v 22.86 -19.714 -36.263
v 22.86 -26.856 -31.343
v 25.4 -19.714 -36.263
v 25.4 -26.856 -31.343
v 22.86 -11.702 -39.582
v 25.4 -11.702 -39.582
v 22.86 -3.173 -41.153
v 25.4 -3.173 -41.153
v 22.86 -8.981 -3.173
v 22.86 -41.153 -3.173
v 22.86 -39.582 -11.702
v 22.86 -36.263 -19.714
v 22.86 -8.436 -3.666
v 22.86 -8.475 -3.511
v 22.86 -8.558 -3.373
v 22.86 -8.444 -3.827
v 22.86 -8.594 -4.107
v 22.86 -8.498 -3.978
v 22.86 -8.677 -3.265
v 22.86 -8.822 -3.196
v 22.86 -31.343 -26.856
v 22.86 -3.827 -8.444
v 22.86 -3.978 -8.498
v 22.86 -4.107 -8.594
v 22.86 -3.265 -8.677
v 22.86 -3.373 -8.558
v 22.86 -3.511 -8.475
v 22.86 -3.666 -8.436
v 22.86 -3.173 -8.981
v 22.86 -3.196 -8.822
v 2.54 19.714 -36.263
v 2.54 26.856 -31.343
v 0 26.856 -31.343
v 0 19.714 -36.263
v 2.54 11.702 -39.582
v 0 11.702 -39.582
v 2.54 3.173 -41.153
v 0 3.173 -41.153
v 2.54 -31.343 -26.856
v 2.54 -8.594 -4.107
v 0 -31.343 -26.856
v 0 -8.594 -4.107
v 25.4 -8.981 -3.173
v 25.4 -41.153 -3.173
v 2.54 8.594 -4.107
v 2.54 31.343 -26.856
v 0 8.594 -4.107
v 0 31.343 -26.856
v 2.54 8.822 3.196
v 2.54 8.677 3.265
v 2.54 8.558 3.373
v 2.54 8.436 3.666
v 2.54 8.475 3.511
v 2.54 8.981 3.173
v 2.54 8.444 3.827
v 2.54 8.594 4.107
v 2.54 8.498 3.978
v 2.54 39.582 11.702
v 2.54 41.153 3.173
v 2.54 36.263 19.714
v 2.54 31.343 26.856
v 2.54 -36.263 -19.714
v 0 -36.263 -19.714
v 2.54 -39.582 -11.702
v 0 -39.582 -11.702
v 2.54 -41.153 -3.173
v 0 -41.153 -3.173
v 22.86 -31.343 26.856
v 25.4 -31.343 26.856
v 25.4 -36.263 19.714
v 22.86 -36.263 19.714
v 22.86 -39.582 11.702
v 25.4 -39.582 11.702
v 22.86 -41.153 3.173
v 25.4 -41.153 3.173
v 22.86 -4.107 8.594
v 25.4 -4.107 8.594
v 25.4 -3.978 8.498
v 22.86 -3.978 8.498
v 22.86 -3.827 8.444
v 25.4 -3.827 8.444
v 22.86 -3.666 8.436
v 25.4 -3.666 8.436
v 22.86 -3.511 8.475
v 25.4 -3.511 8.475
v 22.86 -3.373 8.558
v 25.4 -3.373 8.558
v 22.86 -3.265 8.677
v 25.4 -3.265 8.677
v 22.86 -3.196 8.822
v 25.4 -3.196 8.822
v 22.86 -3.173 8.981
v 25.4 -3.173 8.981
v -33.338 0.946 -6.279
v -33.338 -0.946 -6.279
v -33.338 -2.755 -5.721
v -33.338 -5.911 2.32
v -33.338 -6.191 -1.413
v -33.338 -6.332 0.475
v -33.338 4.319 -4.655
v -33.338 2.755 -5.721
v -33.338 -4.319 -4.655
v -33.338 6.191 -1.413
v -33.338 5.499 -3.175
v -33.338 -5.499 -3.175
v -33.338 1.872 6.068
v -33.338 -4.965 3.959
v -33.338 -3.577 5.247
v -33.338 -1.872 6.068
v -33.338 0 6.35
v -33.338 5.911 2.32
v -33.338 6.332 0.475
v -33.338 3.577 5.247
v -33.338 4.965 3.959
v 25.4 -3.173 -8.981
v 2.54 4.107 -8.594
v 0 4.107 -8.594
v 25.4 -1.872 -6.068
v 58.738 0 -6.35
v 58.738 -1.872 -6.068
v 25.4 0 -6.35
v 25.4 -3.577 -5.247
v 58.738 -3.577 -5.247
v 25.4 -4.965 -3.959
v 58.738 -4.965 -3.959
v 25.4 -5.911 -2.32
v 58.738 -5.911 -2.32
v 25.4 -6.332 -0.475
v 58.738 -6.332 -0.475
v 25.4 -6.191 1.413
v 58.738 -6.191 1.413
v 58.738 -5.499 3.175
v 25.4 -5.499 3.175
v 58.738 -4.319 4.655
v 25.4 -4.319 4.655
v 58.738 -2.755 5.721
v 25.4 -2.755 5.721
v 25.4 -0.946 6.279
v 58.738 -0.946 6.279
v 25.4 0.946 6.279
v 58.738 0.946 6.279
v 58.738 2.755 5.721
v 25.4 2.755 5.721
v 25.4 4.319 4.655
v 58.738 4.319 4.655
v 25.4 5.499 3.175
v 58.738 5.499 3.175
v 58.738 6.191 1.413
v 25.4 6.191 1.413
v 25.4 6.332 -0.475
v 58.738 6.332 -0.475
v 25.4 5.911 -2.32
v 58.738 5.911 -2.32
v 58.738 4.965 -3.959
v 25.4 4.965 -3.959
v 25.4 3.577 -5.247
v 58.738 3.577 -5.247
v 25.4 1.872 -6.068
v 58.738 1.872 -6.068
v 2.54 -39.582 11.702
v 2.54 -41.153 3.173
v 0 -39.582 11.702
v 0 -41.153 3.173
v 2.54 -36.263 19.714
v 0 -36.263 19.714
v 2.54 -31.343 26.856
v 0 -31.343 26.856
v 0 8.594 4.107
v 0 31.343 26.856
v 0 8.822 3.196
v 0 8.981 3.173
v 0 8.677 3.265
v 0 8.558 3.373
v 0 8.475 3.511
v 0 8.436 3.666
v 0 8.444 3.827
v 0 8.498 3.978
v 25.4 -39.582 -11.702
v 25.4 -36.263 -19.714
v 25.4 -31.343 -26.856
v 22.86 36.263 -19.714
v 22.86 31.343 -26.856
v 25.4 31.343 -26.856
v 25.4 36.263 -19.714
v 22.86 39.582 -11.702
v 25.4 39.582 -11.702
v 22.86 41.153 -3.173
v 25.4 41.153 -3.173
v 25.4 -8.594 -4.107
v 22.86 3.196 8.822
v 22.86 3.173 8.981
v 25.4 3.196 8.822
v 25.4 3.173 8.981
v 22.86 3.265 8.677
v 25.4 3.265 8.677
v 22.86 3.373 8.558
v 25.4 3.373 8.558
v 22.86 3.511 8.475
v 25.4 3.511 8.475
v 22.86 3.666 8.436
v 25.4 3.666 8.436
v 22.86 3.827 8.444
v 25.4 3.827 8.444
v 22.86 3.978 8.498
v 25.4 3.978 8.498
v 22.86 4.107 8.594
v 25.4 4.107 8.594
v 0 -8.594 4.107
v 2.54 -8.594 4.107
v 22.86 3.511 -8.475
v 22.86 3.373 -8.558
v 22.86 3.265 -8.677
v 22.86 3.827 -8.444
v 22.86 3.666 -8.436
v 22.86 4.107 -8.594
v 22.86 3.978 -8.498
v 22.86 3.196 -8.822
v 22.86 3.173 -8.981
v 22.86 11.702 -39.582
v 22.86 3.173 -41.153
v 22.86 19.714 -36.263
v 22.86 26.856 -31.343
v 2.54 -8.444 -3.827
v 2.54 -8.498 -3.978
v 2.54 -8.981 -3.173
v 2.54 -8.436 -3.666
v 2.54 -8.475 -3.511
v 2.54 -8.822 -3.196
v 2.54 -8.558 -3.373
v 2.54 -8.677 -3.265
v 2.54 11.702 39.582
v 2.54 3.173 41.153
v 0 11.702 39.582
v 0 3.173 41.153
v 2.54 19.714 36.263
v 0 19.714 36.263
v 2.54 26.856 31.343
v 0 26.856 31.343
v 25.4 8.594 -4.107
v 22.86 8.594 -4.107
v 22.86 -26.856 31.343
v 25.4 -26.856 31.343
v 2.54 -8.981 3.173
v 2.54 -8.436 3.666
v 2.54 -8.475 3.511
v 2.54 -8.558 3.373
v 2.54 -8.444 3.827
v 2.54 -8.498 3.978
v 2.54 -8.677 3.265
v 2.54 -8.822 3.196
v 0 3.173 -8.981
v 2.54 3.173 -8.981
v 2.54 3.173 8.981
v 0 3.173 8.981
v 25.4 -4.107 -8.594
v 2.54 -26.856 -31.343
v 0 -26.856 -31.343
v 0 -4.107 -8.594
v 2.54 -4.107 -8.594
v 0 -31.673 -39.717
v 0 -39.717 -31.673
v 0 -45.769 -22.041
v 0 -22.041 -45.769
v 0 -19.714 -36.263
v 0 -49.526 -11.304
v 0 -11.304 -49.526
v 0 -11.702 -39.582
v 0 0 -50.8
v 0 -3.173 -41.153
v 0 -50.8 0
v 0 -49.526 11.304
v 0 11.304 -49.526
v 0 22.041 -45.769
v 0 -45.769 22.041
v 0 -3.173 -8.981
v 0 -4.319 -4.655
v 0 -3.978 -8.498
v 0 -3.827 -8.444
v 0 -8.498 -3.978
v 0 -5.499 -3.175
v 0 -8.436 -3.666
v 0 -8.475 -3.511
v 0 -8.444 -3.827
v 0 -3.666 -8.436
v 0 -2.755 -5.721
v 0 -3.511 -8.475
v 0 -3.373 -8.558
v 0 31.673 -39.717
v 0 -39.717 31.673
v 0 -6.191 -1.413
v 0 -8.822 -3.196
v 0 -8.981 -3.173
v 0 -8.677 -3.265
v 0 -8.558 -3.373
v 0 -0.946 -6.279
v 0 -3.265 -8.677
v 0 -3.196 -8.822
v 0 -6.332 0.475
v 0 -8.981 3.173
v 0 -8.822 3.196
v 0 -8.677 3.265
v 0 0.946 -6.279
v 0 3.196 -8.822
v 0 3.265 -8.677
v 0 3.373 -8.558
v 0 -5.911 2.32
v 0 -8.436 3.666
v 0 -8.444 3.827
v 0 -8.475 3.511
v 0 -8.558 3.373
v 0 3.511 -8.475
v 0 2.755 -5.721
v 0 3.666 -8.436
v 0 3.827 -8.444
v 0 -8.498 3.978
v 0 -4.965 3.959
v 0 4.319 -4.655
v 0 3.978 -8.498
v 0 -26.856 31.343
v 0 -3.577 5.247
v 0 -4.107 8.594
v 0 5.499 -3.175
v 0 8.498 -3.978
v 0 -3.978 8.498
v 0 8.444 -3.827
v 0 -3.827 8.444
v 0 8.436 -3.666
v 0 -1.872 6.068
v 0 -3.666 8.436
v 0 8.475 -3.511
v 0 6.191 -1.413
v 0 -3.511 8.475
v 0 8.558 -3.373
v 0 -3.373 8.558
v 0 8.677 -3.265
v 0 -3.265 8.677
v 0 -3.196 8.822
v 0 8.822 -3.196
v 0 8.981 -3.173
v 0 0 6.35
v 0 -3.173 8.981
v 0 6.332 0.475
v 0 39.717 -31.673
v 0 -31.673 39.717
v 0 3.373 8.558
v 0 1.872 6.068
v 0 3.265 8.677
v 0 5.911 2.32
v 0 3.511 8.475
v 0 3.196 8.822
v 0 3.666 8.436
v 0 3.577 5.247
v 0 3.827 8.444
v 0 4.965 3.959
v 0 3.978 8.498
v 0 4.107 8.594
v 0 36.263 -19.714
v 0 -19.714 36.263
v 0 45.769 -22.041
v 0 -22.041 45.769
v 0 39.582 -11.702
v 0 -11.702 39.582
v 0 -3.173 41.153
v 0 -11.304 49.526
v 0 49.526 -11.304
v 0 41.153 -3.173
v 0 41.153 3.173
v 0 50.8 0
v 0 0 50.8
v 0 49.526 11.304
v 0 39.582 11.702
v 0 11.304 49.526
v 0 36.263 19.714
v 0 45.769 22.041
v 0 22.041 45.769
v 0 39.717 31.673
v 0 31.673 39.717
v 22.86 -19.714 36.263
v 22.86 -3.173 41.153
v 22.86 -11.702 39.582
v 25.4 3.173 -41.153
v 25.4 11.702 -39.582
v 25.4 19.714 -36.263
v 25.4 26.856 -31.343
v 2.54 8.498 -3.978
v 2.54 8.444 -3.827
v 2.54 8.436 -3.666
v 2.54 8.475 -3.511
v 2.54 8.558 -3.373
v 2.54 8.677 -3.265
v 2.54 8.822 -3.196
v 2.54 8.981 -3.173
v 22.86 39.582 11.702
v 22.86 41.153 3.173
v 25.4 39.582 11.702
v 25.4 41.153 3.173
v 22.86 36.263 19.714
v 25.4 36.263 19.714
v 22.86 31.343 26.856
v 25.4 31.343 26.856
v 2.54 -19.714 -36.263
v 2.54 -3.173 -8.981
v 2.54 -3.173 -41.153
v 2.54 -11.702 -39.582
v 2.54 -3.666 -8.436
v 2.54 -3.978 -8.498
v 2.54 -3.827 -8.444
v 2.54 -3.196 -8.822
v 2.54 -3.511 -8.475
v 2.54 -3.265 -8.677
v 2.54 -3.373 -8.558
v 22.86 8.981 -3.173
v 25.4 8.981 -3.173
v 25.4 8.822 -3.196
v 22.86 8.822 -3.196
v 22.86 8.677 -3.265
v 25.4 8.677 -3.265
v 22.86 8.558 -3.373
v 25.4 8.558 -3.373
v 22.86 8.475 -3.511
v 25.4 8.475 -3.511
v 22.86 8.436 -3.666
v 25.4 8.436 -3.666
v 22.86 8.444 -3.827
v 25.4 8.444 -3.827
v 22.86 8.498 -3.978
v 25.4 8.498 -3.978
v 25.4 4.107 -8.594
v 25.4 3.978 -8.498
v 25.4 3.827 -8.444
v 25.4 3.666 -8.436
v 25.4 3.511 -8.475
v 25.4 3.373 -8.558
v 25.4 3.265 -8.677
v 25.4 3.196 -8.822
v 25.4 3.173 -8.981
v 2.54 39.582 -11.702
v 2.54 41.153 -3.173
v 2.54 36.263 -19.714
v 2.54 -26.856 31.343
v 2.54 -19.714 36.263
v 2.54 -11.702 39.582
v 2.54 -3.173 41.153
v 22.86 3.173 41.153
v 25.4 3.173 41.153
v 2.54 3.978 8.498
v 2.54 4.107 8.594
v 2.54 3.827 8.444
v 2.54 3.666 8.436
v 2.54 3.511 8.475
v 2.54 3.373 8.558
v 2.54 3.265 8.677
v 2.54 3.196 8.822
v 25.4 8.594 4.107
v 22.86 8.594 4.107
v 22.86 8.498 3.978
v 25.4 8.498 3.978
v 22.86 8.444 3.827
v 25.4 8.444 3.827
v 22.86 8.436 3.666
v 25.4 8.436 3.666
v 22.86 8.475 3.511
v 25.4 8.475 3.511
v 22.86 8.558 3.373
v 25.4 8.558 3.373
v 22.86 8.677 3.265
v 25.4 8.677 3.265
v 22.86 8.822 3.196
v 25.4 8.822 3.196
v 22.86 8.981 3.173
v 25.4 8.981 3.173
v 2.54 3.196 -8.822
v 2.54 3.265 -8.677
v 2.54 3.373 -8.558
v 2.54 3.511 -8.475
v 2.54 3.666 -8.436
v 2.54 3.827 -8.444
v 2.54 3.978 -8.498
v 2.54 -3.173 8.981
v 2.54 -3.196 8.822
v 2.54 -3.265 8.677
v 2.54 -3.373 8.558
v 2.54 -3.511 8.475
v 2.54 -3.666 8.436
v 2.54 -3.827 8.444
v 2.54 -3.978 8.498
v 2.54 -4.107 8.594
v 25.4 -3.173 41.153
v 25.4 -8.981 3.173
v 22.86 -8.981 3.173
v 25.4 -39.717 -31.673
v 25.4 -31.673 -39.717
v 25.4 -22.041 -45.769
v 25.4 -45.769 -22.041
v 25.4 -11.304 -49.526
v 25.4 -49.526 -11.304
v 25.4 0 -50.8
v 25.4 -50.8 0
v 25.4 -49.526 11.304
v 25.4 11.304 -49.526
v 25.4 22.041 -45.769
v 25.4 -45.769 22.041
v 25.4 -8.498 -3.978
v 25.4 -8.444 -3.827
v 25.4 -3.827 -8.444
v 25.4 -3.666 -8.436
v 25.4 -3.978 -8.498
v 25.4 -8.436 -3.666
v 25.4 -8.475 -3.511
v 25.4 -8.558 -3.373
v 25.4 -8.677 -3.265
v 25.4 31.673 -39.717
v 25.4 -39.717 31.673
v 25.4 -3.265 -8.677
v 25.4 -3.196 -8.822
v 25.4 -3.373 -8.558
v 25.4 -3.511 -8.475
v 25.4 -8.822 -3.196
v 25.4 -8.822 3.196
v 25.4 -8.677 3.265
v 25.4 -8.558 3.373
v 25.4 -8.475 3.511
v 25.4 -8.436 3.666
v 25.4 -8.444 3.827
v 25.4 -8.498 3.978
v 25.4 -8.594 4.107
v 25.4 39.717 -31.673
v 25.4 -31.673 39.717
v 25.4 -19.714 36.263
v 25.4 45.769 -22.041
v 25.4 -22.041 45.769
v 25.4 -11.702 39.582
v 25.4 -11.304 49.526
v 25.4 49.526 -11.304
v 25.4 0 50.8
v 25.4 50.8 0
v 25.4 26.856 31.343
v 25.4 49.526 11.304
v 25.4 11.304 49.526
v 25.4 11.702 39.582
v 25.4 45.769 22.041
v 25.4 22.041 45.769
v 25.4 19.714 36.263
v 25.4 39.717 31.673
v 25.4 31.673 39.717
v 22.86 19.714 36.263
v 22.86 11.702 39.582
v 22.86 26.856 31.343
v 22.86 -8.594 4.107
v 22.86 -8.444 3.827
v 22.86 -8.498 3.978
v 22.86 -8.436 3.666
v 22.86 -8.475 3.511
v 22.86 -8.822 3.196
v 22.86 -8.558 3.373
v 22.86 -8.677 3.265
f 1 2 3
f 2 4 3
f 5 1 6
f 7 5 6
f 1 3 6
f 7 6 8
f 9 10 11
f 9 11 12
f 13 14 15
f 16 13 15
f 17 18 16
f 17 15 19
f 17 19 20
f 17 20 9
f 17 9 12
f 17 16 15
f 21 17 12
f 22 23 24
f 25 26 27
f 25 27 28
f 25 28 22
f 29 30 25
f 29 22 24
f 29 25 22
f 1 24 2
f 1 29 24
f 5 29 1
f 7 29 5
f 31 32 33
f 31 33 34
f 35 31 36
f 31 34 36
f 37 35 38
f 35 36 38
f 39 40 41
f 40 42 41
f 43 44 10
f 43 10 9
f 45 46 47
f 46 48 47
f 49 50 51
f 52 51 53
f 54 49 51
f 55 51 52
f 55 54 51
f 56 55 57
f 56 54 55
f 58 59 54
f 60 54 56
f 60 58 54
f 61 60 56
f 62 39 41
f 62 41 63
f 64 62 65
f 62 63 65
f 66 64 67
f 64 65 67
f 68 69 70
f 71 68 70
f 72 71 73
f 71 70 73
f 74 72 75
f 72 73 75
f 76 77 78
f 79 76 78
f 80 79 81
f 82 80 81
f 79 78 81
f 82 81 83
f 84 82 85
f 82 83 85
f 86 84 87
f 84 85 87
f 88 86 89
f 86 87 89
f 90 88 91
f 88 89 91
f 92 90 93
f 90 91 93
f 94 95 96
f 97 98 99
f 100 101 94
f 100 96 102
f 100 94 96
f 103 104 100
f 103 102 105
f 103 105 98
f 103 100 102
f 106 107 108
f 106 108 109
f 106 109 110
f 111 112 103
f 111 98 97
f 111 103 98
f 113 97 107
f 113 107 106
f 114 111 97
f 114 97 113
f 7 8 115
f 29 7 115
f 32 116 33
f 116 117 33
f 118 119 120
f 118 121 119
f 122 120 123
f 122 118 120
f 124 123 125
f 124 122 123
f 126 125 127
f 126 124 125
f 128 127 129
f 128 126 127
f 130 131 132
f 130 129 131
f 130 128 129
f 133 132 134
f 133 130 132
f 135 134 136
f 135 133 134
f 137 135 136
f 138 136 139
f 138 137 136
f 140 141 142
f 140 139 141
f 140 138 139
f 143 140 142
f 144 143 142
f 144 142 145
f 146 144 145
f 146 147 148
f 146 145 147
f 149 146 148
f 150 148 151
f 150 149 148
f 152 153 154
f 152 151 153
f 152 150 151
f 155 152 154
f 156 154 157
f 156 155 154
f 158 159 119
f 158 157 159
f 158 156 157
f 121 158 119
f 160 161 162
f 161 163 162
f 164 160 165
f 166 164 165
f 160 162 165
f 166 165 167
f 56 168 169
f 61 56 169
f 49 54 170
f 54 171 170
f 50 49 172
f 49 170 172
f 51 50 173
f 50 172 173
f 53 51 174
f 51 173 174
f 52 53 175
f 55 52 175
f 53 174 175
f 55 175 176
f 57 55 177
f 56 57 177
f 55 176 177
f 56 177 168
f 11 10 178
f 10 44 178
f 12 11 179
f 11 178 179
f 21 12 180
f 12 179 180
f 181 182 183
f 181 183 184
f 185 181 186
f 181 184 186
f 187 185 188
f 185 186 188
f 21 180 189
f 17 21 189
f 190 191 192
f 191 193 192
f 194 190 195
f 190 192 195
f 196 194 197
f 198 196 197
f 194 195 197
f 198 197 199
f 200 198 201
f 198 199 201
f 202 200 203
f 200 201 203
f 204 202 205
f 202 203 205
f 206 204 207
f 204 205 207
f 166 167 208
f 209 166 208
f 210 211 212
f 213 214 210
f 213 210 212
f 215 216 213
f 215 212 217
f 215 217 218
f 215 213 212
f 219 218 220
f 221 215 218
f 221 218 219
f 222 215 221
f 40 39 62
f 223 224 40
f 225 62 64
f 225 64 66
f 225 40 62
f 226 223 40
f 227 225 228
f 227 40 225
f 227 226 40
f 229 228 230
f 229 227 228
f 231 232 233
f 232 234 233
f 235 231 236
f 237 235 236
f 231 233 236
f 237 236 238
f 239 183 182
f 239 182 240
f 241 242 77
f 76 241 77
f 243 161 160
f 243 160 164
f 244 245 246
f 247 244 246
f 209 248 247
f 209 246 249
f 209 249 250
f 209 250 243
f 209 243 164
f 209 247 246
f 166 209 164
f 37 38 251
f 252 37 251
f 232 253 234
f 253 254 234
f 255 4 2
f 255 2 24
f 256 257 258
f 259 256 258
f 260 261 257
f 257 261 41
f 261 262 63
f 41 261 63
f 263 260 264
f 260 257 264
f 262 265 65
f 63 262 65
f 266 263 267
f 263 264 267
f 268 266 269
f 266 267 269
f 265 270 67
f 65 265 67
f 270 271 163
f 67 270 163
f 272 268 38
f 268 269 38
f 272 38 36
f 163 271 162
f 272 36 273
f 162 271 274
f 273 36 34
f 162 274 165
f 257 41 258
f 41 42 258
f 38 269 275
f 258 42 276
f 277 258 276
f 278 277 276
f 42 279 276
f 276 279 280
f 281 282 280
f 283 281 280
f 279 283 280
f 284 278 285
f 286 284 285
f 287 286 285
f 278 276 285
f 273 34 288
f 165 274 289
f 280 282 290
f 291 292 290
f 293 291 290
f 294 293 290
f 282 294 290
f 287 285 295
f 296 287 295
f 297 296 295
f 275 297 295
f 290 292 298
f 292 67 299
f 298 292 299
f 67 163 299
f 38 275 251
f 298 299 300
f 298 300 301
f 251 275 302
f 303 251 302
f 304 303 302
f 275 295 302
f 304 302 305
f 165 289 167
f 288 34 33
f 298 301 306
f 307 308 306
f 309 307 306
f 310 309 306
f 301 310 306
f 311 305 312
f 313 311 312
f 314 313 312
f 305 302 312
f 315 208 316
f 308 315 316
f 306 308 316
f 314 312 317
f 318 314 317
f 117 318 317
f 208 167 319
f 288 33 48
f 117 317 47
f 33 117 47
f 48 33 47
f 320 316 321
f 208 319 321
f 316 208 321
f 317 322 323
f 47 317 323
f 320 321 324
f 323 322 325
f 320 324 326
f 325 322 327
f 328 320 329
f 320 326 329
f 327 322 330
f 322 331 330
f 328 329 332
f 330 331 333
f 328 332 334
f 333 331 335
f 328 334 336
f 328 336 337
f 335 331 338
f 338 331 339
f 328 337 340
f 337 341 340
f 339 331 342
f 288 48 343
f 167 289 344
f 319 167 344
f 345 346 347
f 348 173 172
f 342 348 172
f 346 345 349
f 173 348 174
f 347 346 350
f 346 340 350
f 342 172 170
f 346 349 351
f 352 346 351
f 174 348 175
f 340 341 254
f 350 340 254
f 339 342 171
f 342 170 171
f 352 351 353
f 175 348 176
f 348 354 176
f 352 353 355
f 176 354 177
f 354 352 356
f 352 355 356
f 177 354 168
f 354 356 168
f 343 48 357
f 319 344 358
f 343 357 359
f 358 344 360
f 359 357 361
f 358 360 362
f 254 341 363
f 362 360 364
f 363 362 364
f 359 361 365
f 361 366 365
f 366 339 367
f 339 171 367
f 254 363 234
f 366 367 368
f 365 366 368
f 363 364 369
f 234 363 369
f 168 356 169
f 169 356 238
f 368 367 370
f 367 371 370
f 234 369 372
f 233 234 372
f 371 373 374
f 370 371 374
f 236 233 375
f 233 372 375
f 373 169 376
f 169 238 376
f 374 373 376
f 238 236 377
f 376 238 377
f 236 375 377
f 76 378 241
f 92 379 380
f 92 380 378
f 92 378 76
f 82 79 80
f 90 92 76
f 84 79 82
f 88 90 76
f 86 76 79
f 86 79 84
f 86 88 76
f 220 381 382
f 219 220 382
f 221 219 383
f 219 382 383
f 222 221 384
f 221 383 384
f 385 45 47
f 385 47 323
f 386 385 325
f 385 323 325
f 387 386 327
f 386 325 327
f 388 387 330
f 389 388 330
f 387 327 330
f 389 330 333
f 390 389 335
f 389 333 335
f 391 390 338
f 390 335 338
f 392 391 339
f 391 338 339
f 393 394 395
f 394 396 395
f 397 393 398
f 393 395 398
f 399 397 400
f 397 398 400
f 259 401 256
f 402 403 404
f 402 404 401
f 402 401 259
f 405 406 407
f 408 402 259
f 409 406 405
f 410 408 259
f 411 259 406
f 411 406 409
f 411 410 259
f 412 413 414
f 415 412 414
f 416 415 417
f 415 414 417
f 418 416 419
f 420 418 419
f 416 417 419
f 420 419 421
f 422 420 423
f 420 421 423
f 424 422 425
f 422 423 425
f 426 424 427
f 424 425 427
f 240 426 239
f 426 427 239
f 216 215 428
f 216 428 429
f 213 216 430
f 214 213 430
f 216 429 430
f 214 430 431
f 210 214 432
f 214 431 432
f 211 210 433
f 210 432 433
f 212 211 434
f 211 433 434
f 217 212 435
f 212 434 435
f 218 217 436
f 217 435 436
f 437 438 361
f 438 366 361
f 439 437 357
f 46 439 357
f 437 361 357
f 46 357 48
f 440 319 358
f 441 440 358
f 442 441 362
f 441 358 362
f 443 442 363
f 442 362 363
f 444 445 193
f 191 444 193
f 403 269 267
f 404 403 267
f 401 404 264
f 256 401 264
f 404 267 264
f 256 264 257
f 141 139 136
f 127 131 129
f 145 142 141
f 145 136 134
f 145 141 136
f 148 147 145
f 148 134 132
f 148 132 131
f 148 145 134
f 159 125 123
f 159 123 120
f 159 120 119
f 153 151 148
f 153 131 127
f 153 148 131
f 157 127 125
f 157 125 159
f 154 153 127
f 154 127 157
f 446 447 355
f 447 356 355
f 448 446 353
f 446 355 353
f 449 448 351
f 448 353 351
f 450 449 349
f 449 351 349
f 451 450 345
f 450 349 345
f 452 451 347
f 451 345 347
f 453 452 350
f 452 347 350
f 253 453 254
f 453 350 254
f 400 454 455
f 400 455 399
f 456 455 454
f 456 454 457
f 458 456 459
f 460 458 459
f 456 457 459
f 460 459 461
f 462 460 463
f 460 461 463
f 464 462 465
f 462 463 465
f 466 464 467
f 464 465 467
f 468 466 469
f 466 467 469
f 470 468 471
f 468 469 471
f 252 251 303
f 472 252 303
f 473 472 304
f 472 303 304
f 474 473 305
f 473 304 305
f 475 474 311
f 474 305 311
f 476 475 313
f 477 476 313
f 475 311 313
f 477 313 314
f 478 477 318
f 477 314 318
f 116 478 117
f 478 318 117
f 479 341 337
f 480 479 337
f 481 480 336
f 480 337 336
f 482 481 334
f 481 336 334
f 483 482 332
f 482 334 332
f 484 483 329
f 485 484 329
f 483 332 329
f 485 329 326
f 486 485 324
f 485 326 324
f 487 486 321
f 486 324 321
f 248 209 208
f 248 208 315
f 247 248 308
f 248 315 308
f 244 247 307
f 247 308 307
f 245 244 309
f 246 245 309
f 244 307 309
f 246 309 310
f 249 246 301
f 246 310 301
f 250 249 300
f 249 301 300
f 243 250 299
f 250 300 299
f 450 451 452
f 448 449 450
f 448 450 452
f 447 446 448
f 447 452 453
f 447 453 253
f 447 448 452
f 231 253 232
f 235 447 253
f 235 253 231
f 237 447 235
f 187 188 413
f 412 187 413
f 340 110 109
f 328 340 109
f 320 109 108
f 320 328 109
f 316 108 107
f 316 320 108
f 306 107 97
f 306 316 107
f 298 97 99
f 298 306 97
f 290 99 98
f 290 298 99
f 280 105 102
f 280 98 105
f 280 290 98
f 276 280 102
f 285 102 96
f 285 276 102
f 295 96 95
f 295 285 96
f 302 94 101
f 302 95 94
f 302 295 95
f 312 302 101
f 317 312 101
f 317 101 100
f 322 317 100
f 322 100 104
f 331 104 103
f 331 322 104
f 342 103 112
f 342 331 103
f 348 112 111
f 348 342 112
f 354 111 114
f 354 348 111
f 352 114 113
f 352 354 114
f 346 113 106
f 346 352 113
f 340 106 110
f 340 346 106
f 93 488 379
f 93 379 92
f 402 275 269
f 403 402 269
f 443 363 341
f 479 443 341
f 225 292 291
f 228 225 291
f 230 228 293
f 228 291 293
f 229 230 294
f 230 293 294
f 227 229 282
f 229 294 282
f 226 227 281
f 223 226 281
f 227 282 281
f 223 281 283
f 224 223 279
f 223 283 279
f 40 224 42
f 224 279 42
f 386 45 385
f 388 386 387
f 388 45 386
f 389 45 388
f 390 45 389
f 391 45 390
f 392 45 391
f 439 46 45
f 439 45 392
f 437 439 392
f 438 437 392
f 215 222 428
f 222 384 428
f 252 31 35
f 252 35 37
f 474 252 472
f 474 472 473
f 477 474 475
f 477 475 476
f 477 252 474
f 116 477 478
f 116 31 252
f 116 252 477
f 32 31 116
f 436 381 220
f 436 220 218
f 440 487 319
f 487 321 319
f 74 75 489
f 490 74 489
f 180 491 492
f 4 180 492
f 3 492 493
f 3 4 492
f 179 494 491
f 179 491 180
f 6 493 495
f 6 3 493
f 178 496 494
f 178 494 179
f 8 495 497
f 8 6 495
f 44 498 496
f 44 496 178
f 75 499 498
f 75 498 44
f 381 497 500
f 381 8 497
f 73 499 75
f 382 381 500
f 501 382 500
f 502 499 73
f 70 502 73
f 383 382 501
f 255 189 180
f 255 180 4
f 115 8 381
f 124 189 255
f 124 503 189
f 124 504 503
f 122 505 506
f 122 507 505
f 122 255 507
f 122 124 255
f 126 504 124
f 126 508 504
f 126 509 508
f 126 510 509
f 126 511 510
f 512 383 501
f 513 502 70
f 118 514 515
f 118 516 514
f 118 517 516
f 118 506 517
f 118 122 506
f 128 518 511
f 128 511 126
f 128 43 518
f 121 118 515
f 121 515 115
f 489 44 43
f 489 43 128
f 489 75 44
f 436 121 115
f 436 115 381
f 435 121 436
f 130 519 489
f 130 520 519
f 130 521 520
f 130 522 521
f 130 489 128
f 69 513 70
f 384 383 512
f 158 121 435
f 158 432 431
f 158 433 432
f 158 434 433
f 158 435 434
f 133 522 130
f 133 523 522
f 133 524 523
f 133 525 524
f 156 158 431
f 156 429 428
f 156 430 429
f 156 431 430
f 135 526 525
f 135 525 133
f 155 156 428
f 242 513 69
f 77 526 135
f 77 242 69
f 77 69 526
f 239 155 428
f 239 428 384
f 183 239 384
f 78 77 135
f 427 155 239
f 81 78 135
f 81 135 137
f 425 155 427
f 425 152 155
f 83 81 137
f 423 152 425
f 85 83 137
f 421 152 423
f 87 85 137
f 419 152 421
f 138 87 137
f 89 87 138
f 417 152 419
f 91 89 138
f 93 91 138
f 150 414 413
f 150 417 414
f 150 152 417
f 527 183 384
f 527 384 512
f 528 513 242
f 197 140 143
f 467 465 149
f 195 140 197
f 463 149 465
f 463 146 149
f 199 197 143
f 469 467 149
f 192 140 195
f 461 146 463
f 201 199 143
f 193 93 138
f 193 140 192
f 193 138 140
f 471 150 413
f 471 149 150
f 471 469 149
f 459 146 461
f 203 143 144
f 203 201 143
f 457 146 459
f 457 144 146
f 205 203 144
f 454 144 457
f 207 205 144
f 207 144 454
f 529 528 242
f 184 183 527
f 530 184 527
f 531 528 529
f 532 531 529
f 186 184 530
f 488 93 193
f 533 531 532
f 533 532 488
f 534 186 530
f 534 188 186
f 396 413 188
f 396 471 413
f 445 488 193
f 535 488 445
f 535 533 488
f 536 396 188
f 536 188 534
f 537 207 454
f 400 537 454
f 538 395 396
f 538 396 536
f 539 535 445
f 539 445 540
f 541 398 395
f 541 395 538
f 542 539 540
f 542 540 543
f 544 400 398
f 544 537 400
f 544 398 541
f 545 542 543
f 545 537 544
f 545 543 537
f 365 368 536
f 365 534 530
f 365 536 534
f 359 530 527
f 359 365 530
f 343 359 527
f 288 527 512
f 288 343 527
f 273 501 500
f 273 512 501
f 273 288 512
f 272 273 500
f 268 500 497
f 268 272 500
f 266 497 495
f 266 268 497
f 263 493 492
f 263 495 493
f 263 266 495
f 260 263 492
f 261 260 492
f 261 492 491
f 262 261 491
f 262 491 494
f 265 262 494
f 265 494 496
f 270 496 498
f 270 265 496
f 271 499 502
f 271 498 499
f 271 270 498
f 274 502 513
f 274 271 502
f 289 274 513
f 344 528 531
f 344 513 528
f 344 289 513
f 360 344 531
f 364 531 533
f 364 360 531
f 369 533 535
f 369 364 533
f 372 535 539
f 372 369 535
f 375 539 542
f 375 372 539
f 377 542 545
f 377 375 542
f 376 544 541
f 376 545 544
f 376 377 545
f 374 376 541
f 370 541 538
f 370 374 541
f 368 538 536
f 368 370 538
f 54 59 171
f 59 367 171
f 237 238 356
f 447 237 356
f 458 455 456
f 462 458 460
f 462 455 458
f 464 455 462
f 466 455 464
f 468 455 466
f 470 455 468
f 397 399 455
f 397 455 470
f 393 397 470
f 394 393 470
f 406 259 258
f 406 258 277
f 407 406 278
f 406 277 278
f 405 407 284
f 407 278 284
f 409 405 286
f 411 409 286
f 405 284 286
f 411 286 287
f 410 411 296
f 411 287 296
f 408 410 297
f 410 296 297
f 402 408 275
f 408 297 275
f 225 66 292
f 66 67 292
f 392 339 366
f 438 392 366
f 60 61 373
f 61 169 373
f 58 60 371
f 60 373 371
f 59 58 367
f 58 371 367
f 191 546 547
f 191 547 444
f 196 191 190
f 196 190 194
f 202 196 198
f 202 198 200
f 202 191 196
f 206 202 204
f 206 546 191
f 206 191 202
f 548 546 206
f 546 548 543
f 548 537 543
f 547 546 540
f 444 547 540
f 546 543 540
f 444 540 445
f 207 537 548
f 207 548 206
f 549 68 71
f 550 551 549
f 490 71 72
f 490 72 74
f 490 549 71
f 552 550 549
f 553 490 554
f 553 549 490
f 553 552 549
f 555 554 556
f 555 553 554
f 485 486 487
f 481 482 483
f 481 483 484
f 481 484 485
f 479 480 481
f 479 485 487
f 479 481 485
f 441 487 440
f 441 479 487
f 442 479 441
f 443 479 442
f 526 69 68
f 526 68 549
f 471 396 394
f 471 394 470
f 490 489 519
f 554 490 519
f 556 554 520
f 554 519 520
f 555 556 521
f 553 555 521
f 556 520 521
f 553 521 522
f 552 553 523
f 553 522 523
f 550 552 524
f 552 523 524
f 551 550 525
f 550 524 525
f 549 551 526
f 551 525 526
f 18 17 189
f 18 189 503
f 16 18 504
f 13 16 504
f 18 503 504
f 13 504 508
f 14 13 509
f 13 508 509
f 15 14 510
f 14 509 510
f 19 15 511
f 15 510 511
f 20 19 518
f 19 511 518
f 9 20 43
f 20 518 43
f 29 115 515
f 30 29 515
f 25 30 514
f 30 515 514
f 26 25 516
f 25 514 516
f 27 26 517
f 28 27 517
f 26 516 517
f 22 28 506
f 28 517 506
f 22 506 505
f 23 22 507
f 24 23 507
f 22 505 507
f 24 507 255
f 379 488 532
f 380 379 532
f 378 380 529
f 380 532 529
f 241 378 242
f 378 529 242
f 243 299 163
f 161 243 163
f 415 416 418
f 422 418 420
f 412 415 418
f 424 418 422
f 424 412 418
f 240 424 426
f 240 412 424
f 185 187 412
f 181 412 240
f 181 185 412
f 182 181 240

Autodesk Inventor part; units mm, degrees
ref_plane "YZ Plane" through (0, 0, 0) normal (1, 0, 0) x (0, 1, 0)
ref_plane "XZ Plane" through (0, 0, 0) normal (0, 1, 0) x (-1, 0, 0)
ref_plane "XY Plane" through (0, 0, 0) normal (0, 0, 1) x (1, 0, 0)
sketch "Sketch1" plane through (0, 0, 0) normal (1, 0, 0) x (0, 1, 0)
  circle A0 centre (0, 0) radius 50.8
  dimension "d0" = 101.6
extrude "Extrusion1" add sketch "Sketch1" along normal blind 25.4
sketch "Sketch2" plane through (25.4, 0, 0) normal (1, 0, 0) x (0, 0, -1)
  circle A0 centre (0, 0) radius 6.35
  dimension "d4" = 12.7
extrude "Extrusion2" add sketch "Sketch2" along normal blind 33.3375
sketch "Sketch3" plane through (0, 0, 0) normal (-1, 0, 0) x (0, 0, 1)
  circle A0 centre (0, 0) radius 6.35
extrude "Extrusion3" add sketch "Sketch3" along normal blind 33.3375
sketch "Sketch5" plane through (25.4, 0, 0) normal (1, 0, 0) x (0, 0, -1)
  circle A0 centre (0, 0) radius 44.45
  arc A1 (31.3429, -26.8561) -> (41.1529, -3.1727) centre (0, 0) ccw
  line L0 (0, 0) -> (82.55, 0) construction
  line L1 (41.1529, -3.1727) -> (8.9811, -3.1727)
  line L2 (31.3429, -26.8561) -> (82.1429, -26.8561) construction
  line L3 (31.3429, -26.8561) -> (8.594, -4.1072)
  line L4 (-4.1072, 8.594) -> (-4.5781, 9.0649)
  arc A2 (8.9811, -3.1727) -> (8.594, -4.1072) centre (8.9811, -3.7201) ccw
  arc A3 (41.1529, 3.1727) -> (31.3429, 26.8561) centre (0, 0) ccw
  line L5 (31.3429, 26.8561) -> (8.594, 4.1072)
  line L6 (41.1529, 3.1727) -> (8.9811, 3.1727)
  arc A4 (8.594, 4.1072) -> (8.9811, 3.1727) centre (8.9811, 3.7201) ccw
  arc A5 (26.8561, 31.3429) -> (3.1727, 41.1529) centre (0, 0) ccw
  line L7 (3.1727, 41.1529) -> (3.1727, 8.9811)
  line L8 (26.8561, 31.3429) -> (4.1072, 8.594)
  arc A6 (3.1727, 8.9811) -> (4.1072, 8.594) centre (3.7201, 8.9811) ccw
  arc A7 (-3.1727, 41.1529) -> (-26.8561, 31.3429) centre (0, 0) ccw
  line L9 (-26.8561, 31.3429) -> (-4.1072, 8.594)
  line L10 (-3.1727, 41.1529) -> (-3.1727, 8.9811)
  arc A8 (-4.1072, 8.594) -> (-3.1727, 8.9811) centre (-3.7201, 8.9811) ccw
  arc A9 (-31.3429, 26.8561) -> (-41.1529, 3.1727) centre (0, 0) ccw
  line L11 (-41.1529, 3.1727) -> (-8.9811, 3.1727)
  line L12 (-31.3429, 26.8561) -> (-8.594, 4.1072)
  arc A10 (-8.9811, 3.1727) -> (-8.594, 4.1072) centre (-8.9811, 3.7201) ccw
  arc A11 (-41.1529, -3.1727) -> (-31.3429, -26.8561) centre (0, 0) ccw
  line L13 (-31.3429, -26.8561) -> (-8.594, -4.1072)
  line L14 (-41.1529, -3.1727) -> (-8.9811, -3.1727)
  arc A12 (-8.594, -4.1072) -> (-8.9811, -3.1727) centre (-8.9811, -3.7201) ccw
  arc A13 (-26.8561, -31.3429) -> (-3.1727, -41.1529) centre (0, 0) ccw
  line L15 (-3.1727, -41.1529) -> (-3.1727, -8.9811)
  line L16 (-26.8561, -31.3429) -> (-4.1072, -8.594)
  arc A14 (-3.1727, -8.9811) -> (-4.1072, -8.594) centre (-3.7201, -8.9811) ccw
  arc A15 (3.1727, -41.1529) -> (26.8561, -31.3429) centre (0, 0) ccw
  line L17 (26.8561, -31.3429) -> (4.1072, -8.594)
  line L18 (3.1727, -41.1529) -> (3.1727, -8.9811)
  arc A16 (4.1072, -8.594) -> (3.1727, -8.9811) centre (3.7201, -8.9811) ccw
  dimension "d12" = 88.9
  dimension "d13" = 82.55
  dimension "d24" = 360
extrude "Extrusion5" cut sketch "Sketch5" against normal blind 2.54 contours L3 A2 L1 A1 | L4 L9 A7 L10 A8 | L6 A4 L5 A3 | L8 A6 L7 A5 | L12 A10 L11 A9 | L14 A12 L13 A11 | L16 A14 L15 A13 | L18 A16 L17 A15
sketch "Sketch6" plane through (0, 0, 0) normal (-1, 0, 0) x (0, 0, 1)
  circle A0 centre (0, 0) radius 44.45
  arc A1 (-31.3429, 26.8561) -> (-41.1529, 3.1727) centre (0, 0) ccw
  line L0 (-8.594, 4.1072) -> (-31.3429, 26.8561) projected
  line L1 (-41.1529, 3.1727) -> (-8.9811, 3.1727)
  line L2 (-41.1529, 3.1727) -> (-8.9811, 3.1727) projected
  line L3 (-8.594, 4.1072) -> (-31.3429, 26.8561)
  arc A2 (-8.9811, 3.1727) -> (-8.594, 4.1072) centre (-8.9811, 3.7201) ccw
  arc A3 (-41.1529, -3.1727) -> (-31.3429, -26.8561) centre (0, 0) ccw
  line L4 (-31.3429, -26.8561) -> (-8.594, -4.1072)
  line L5 (-8.9811, -3.1727) -> (-41.1529, -3.1727)
  arc A4 (-8.594, -4.1072) -> (-8.9811, -3.1727) centre (-8.9811, -3.7201) ccw
  arc A5 (-26.8561, -31.3429) -> (-3.1727, -41.1529) centre (0, 0) ccw
  line L6 (-3.1727, -41.1529) -> (-3.1727, -8.9811)
  line L7 (-4.1072, -8.594) -> (-26.8561, -31.3429)
  arc A6 (-3.1727, -8.9811) -> (-4.1072, -8.594) centre (-3.7201, -8.9811) ccw
  arc A7 (3.1727, -41.1529) -> (26.8561, -31.3429) centre (0, 0) ccw
  line L8 (26.8561, -31.3429) -> (4.1072, -8.594)
  line L9 (3.1727, -8.9811) -> (3.1727, -41.1529)
  arc A8 (4.1072, -8.594) -> (3.1727, -8.9811) centre (3.7201, -8.9811) ccw
  arc A9 (31.3429, -26.8561) -> (41.1529, -3.1727) centre (0, 0) ccw
  line L10 (41.1529, -3.1727) -> (8.9811, -3.1727)
  line L11 (8.594, -4.1072) -> (31.3429, -26.8561)
  arc A10 (8.9811, -3.1727) -> (8.594, -4.1072) centre (8.9811, -3.7201) ccw
  arc A11 (41.1529, 3.1727) -> (31.3429, 26.8561) centre (0, 0) ccw
  line L12 (31.3429, 26.8561) -> (8.594, 4.1072)
  line L13 (8.9811, 3.1727) -> (41.1529, 3.1727)
  arc A12 (8.594, 4.1072) -> (8.9811, 3.1727) centre (8.9811, 3.7201) ccw
  arc A13 (26.8561, 31.3429) -> (3.1727, 41.1529) centre (0, 0) ccw
  line L14 (3.1727, 41.1529) -> (3.1727, 8.9811)
  line L15 (4.1072, 8.594) -> (26.8561, 31.3429)
  arc A14 (3.1727, 8.9811) -> (4.1072, 8.594) centre (3.7201, 8.9811) ccw
  arc A15 (-3.1727, 41.1529) -> (-26.8561, 31.3429) centre (0, 0) ccw
  line L16 (-26.8561, 31.3429) -> (-4.1072, 8.594)
  line L17 (-3.1727, 8.9811) -> (-3.1727, 41.1529)
  arc A16 (-4.1072, 8.594) -> (-3.1727, 8.9811) centre (-3.7201, 8.9811) ccw
  dimension "d28" = 88.9
  dimension "d32" = 360
extrude "Extrusion6" cut sketch "Sketch6" against normal blind 2.54 contours L0 A2 L1 A1 | L5 A4 L4 A3 | L7 A6 L6 A5 | L9 A8 L8 A7 | L11 A10 L10 A9 | L13 A12 L12 A11 | L15 A14 L14 A13 | L17 A16 L16 A15
properties part number "Wheel"
